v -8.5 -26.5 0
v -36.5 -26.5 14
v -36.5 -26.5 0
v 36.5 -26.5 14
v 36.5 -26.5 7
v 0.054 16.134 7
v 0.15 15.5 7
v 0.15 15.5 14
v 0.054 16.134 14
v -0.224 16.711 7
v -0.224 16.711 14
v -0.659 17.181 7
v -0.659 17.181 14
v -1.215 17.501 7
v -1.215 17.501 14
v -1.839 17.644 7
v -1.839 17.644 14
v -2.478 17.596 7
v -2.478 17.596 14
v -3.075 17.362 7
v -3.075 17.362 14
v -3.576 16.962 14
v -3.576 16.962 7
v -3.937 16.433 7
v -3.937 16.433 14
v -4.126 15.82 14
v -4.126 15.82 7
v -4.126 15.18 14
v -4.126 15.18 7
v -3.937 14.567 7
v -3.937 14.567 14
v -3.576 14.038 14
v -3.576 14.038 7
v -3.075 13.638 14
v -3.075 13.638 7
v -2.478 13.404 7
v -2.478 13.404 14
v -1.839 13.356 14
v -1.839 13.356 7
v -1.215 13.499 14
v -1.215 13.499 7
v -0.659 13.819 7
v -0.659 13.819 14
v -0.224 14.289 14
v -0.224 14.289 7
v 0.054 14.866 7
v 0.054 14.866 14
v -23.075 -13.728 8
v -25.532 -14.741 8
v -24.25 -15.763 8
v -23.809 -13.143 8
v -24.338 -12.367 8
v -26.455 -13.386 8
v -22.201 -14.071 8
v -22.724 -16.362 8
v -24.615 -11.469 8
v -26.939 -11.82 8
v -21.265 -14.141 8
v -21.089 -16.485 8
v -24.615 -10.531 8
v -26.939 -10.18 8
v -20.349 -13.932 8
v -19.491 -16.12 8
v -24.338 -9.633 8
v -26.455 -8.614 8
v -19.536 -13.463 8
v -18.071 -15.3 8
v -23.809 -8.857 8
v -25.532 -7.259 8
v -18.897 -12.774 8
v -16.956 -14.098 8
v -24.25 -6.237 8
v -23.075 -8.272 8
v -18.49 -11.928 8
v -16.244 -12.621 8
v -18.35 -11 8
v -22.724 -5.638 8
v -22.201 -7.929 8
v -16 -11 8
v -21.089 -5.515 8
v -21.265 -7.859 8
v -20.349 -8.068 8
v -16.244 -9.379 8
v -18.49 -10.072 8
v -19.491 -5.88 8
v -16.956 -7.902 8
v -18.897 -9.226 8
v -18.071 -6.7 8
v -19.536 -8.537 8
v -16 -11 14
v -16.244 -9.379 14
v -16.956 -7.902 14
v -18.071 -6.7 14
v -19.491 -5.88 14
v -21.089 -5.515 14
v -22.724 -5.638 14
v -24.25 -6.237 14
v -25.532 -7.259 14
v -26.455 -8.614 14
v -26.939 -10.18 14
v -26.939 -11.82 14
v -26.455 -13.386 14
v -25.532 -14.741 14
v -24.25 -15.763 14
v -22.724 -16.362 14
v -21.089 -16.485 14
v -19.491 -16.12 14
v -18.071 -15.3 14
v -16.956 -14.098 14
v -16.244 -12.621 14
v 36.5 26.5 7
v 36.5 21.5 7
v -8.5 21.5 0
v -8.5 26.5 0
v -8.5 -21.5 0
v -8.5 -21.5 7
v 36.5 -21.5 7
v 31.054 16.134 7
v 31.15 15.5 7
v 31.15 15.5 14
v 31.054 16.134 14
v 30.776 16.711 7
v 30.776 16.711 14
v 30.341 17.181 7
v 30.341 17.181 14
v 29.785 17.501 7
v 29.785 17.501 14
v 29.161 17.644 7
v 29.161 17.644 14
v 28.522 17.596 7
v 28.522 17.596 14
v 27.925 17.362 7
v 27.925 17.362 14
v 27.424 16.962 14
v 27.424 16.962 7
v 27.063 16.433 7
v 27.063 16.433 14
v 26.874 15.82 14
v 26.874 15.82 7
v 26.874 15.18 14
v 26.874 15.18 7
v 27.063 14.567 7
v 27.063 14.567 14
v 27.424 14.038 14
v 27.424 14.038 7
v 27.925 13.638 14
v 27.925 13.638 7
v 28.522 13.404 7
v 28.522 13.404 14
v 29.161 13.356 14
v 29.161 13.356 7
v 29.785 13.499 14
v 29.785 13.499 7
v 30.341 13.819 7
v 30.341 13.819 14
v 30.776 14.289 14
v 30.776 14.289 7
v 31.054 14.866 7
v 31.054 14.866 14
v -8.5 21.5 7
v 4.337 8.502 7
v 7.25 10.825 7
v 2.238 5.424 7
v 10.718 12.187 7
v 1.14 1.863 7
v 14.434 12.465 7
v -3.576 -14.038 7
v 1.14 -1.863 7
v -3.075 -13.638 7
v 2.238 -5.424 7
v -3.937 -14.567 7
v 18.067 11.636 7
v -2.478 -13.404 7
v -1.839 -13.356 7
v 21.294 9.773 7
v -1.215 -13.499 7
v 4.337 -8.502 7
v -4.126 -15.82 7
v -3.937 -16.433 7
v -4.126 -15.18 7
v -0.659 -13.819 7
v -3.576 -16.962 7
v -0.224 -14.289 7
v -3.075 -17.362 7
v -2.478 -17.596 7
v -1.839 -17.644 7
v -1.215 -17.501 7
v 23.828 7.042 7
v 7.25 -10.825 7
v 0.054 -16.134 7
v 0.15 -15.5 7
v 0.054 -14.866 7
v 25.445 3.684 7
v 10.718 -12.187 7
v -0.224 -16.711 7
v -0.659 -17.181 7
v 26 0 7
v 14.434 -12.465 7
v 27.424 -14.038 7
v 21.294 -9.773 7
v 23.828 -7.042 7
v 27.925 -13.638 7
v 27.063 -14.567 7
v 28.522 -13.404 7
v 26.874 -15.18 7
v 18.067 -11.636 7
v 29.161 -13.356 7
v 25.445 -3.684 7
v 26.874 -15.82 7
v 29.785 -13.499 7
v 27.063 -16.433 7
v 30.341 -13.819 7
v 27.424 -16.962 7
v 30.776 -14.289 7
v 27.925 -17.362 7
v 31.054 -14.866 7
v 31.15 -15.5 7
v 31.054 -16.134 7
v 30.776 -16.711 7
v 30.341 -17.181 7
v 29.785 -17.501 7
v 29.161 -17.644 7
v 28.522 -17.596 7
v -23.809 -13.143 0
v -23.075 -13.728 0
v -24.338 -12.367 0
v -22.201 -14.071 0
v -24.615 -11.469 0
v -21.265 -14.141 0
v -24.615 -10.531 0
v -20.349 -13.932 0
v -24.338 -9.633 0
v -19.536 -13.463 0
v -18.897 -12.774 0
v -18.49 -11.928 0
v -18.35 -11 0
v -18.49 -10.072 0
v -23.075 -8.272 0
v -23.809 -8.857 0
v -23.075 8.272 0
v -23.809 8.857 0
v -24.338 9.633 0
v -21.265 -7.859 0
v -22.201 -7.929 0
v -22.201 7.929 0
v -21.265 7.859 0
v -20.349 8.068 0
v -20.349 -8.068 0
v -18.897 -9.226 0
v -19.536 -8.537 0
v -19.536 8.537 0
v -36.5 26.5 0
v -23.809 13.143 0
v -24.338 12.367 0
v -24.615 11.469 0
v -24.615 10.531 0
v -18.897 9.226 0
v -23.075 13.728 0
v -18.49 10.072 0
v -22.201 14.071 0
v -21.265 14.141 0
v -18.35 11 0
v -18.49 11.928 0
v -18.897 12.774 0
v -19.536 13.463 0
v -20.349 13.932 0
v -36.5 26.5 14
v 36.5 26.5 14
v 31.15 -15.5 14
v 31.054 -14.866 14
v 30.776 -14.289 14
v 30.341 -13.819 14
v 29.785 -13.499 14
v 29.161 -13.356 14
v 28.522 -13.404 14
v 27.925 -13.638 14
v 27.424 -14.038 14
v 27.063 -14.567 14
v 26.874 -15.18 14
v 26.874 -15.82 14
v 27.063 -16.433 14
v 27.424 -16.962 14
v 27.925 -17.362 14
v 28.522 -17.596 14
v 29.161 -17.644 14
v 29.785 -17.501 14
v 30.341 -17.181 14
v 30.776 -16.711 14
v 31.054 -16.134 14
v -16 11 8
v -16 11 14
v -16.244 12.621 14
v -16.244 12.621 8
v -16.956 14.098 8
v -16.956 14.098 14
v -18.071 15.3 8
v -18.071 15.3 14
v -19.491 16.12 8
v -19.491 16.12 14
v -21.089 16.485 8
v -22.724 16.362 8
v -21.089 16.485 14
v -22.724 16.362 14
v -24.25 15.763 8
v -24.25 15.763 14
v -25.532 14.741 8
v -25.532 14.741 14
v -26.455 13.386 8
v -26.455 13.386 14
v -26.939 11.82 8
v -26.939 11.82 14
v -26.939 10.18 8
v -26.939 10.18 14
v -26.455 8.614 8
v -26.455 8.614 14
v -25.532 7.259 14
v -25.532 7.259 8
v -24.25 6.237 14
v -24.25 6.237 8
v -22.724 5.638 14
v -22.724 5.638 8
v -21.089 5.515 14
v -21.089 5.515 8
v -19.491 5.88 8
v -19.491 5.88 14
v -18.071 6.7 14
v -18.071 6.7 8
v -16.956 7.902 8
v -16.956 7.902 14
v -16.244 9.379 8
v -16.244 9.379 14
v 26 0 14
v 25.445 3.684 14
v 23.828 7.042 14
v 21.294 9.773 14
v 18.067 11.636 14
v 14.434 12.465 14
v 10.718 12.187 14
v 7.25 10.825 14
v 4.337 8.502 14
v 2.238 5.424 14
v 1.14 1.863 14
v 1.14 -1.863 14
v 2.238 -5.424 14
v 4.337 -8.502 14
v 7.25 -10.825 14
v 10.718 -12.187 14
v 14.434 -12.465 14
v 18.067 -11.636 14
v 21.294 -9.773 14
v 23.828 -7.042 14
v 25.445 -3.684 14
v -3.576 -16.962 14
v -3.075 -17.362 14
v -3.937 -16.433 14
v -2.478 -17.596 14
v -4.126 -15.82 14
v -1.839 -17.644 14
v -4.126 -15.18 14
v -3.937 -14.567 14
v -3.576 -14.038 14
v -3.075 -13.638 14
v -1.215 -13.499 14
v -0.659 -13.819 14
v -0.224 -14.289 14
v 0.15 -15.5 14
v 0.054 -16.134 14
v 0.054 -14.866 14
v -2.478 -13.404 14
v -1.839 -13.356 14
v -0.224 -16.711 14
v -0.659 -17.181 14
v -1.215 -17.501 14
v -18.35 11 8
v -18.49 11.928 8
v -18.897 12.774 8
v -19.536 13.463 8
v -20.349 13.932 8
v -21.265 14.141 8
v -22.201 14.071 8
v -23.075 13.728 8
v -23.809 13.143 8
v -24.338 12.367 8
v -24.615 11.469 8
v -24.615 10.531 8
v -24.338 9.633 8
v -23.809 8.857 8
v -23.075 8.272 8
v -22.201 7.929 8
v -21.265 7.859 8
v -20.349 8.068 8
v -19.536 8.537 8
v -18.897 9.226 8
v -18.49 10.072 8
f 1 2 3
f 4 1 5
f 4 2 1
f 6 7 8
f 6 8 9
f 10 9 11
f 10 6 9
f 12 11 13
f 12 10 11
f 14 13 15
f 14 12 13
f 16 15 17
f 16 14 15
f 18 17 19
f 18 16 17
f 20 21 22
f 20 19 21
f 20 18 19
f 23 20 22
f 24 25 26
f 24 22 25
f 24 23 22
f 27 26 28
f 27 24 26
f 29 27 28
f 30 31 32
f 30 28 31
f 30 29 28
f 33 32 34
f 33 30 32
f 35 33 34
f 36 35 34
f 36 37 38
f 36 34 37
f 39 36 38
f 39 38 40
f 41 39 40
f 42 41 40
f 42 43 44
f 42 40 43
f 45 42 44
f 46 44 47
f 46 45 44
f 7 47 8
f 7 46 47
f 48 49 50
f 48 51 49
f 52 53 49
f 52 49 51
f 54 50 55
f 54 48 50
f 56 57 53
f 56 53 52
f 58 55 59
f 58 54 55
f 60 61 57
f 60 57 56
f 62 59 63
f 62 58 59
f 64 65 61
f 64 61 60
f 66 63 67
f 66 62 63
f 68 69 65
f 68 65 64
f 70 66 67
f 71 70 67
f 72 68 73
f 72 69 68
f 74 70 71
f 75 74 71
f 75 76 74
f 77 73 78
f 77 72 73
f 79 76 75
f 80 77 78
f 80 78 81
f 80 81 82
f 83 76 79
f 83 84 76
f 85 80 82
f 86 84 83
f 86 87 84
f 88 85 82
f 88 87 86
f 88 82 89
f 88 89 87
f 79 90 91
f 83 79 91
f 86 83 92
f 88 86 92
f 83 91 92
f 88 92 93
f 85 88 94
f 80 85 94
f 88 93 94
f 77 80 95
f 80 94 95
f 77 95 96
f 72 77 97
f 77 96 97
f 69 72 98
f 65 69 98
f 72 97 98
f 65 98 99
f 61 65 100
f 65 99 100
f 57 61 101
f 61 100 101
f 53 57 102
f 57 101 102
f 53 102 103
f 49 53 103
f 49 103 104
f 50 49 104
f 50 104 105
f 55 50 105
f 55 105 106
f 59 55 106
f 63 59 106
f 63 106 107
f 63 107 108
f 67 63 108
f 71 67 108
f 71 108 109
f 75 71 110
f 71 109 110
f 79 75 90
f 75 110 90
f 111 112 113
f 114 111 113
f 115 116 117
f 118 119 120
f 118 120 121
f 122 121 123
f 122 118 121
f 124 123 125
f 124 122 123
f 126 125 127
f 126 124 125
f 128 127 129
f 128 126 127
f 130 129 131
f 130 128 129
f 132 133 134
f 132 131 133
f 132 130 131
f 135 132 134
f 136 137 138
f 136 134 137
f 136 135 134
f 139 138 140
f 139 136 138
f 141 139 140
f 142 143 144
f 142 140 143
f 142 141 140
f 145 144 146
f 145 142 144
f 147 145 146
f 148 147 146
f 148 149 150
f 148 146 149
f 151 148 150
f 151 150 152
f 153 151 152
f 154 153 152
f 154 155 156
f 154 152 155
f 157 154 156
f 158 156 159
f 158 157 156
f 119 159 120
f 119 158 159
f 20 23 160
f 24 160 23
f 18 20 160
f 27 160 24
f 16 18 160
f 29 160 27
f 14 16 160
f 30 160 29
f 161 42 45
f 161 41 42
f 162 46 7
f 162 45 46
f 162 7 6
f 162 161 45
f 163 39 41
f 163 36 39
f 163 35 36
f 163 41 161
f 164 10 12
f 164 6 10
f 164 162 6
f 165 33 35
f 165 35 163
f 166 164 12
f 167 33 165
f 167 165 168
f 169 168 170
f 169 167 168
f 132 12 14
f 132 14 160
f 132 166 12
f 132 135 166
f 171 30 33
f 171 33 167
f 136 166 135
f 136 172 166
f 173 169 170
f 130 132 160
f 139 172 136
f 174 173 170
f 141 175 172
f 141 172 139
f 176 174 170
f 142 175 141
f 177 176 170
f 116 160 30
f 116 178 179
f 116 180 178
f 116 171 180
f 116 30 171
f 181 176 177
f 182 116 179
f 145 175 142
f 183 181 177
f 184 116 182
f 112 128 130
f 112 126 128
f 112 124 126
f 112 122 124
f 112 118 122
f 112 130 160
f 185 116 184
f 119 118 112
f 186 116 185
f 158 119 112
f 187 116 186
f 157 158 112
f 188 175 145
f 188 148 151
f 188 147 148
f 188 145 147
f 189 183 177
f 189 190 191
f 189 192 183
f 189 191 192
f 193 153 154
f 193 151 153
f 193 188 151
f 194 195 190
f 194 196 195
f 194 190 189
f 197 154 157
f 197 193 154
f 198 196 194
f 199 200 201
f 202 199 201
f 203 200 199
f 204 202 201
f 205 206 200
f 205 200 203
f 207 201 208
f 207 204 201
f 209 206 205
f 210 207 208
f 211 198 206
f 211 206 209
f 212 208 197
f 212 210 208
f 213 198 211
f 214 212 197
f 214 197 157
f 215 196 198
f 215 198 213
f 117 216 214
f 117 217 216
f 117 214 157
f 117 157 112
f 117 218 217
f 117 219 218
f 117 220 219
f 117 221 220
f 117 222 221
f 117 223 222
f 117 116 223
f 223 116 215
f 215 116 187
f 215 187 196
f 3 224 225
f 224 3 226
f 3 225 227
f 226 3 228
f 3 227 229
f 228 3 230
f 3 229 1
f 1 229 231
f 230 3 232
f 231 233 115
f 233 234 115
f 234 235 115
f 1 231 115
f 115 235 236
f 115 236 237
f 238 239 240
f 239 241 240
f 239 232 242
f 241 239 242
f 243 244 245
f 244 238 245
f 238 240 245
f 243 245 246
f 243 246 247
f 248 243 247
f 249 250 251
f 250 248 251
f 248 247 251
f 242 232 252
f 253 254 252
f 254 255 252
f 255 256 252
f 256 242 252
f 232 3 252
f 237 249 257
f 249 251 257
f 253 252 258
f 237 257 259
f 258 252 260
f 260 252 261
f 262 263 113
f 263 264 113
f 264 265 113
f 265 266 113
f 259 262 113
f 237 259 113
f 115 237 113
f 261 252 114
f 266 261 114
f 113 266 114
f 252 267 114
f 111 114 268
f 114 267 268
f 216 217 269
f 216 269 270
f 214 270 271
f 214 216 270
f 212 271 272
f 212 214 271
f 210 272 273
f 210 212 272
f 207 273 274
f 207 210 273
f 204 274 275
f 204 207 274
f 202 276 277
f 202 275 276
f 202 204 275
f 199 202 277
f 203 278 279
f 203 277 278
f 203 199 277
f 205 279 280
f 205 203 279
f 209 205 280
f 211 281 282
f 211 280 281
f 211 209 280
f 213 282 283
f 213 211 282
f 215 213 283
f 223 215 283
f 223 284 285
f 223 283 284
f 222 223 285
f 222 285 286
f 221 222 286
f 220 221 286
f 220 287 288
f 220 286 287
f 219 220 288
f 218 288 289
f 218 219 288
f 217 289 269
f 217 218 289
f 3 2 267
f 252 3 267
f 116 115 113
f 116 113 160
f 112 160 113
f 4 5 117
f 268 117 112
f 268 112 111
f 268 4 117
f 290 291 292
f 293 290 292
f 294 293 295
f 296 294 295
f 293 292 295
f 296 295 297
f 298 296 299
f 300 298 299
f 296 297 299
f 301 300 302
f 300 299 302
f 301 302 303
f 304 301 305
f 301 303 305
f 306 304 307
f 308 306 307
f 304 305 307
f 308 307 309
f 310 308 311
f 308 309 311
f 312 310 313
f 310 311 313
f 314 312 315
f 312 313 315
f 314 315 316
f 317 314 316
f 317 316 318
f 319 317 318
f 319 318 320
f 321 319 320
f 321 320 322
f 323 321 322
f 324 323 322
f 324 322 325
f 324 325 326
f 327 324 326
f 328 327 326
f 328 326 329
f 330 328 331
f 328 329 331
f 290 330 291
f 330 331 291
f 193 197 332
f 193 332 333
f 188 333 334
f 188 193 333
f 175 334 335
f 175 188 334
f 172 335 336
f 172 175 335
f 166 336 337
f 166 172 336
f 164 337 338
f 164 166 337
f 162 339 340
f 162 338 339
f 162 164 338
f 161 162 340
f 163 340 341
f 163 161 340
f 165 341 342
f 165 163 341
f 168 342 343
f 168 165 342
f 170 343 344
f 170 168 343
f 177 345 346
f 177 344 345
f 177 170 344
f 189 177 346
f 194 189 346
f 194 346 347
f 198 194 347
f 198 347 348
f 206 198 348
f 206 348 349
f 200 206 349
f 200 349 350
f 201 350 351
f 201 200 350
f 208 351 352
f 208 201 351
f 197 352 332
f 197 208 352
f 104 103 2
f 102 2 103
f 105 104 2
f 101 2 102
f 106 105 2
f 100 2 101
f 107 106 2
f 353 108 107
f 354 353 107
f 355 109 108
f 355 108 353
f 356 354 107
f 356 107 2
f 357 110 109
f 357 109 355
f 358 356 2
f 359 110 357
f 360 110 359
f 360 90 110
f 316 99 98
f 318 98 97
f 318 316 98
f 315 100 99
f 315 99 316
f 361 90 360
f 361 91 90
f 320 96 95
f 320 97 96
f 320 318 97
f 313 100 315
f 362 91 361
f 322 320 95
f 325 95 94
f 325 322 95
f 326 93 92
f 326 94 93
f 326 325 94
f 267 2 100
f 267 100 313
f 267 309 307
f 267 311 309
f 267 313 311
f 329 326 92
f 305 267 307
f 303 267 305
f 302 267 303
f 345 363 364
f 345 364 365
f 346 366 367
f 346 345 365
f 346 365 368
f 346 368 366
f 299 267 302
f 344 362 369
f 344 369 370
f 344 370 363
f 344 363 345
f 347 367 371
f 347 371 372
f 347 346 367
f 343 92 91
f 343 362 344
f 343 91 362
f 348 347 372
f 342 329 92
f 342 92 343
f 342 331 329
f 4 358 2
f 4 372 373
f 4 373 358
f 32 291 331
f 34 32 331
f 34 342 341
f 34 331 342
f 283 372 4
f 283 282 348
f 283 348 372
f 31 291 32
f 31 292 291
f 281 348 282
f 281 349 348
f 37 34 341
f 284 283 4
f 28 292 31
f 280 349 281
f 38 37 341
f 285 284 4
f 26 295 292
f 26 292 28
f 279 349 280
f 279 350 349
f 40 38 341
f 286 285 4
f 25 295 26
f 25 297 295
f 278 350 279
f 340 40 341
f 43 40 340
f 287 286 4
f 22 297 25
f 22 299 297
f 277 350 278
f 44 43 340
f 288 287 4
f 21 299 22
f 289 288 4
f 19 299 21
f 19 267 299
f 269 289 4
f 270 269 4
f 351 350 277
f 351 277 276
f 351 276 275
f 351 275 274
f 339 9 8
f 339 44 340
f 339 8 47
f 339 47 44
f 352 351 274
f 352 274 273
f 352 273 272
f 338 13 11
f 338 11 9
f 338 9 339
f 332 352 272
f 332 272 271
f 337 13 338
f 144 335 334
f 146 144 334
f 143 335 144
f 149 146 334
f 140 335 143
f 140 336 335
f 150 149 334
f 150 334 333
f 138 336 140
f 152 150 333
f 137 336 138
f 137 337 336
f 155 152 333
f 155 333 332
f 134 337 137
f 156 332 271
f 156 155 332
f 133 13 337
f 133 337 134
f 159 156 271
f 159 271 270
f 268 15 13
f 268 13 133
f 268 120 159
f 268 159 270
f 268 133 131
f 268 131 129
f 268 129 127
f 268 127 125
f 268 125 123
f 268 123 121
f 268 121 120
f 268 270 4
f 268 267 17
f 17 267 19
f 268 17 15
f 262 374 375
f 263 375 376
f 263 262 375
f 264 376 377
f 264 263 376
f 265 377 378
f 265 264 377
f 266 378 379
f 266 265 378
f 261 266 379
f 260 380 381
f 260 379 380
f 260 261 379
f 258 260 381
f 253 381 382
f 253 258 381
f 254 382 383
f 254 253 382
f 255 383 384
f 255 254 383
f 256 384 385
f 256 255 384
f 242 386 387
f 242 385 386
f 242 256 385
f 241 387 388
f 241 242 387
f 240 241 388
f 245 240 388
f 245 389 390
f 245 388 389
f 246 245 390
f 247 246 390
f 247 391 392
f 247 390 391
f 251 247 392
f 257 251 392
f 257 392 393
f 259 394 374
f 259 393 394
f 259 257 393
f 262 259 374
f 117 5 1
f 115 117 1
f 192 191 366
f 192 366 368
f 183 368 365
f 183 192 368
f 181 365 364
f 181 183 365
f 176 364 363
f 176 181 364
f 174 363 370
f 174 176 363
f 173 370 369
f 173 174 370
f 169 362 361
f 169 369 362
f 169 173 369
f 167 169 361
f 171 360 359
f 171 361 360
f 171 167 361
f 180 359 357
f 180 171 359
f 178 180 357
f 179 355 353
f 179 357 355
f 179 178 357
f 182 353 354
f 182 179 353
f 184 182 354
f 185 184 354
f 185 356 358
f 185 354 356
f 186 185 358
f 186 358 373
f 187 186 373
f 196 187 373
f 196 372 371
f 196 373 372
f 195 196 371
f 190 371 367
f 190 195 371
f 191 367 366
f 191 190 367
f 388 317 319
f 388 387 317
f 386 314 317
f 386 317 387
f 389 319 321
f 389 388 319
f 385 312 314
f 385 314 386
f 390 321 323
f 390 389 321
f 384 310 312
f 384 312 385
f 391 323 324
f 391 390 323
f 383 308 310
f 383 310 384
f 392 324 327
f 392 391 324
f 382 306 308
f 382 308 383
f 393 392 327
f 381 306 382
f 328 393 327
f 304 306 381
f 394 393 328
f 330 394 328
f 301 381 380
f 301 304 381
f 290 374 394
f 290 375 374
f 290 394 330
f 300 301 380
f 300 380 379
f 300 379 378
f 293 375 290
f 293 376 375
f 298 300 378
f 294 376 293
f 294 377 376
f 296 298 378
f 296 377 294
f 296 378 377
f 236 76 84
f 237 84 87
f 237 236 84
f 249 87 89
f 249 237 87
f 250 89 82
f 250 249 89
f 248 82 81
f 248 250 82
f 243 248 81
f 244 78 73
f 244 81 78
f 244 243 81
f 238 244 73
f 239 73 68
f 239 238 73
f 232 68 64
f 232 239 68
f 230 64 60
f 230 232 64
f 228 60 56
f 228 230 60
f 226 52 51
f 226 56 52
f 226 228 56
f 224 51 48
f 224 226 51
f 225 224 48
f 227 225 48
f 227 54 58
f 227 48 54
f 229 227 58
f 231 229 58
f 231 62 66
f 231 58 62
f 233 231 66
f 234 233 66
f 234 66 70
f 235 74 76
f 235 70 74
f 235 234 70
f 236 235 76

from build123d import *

# Parameters (mm, degrees)
F0_W     = 73
F0_H     = 43
F0_R     = 3.15
F0_R_2   = 2.15
F0_R_3   = 12.5
F1_DEPTH = 20
F2_W     = 73
F2_H     = 6
F2_W_2   = 45
F2_H_2   = 7
F3_DEPTH = 43.001
F4_W     = 73
F4_H     = 5
F5_DEPTH = 14
F7_DEPTH = 53.001
F8_R     = 5.5
F9_DEPTH = 6


with BuildPart() as f1:
    # F0 (on Top) → F1 (new body)
    with BuildSketch(Plane.XY):
        Rectangle(F0_W, F0_H)
        with Locations((-21.5, -11)):
            Circle(F0_R, mode=Mode.SUBTRACT)
        with Locations((-2, -15.5)):
            Circle(F0_R_2, mode=Mode.SUBTRACT)
        with Locations((29, -15.5)):
            Circle(F0_R_2, mode=Mode.SUBTRACT)
        with Locations((-21.5, 11)):
            Circle(F0_R, mode=Mode.SUBTRACT)
        with Locations((-2, 15.5)):
            Circle(F0_R_2, mode=Mode.SUBTRACT)
        with Locations((13.5, 0)):
            Circle(F0_R_3, mode=Mode.SUBTRACT)
        with Locations((29, 15.5)):
            Circle(F0_R_2, mode=Mode.SUBTRACT)
    extrude(amount=F1_DEPTH)

    # F2 (on face) → F3 (cut, through all)
    with BuildSketch(Plane.XZ.offset(21.5)):
        with Locations((0, 17)):
            Rectangle(F2_W, F2_H)
        with Locations((14, 3.5)):
            Rectangle(F2_W_2, F2_H_2)
    extrude(amount=-F3_DEPTH, mode=Mode.SUBTRACT)

    # F4 (on face) → F5 (join, through all)
    with BuildSketch(Plane.XY.offset(14)):
        with Locations((0, -24)):
            Rectangle(F4_W, F4_H)
        with Locations((0, 24)):
            Rectangle(F4_W, F4_H)
    extrude(amount=-F5_DEPTH)

    # F6 (on face) → F7 (cut, through all)
    with BuildSketch(Plane.XZ.offset(26.5)):
        Polygon((36.5, 7), (-8.5, 0), (36.5, 0), align=None)
    extrude(amount=-F7_DEPTH, mode=Mode.SUBTRACT)

    # F8 (on face) → F9 (cut)
    with BuildSketch(Plane.XY.offset(14)):
        with Locations((-21.5, 11)):
            Circle(F8_R)
        with Locations((-21.5, -11)):
            Circle(F8_R)
    extrude(amount=-F9_DEPTH, mode=Mode.SUBTRACT)


solid = f1.part
